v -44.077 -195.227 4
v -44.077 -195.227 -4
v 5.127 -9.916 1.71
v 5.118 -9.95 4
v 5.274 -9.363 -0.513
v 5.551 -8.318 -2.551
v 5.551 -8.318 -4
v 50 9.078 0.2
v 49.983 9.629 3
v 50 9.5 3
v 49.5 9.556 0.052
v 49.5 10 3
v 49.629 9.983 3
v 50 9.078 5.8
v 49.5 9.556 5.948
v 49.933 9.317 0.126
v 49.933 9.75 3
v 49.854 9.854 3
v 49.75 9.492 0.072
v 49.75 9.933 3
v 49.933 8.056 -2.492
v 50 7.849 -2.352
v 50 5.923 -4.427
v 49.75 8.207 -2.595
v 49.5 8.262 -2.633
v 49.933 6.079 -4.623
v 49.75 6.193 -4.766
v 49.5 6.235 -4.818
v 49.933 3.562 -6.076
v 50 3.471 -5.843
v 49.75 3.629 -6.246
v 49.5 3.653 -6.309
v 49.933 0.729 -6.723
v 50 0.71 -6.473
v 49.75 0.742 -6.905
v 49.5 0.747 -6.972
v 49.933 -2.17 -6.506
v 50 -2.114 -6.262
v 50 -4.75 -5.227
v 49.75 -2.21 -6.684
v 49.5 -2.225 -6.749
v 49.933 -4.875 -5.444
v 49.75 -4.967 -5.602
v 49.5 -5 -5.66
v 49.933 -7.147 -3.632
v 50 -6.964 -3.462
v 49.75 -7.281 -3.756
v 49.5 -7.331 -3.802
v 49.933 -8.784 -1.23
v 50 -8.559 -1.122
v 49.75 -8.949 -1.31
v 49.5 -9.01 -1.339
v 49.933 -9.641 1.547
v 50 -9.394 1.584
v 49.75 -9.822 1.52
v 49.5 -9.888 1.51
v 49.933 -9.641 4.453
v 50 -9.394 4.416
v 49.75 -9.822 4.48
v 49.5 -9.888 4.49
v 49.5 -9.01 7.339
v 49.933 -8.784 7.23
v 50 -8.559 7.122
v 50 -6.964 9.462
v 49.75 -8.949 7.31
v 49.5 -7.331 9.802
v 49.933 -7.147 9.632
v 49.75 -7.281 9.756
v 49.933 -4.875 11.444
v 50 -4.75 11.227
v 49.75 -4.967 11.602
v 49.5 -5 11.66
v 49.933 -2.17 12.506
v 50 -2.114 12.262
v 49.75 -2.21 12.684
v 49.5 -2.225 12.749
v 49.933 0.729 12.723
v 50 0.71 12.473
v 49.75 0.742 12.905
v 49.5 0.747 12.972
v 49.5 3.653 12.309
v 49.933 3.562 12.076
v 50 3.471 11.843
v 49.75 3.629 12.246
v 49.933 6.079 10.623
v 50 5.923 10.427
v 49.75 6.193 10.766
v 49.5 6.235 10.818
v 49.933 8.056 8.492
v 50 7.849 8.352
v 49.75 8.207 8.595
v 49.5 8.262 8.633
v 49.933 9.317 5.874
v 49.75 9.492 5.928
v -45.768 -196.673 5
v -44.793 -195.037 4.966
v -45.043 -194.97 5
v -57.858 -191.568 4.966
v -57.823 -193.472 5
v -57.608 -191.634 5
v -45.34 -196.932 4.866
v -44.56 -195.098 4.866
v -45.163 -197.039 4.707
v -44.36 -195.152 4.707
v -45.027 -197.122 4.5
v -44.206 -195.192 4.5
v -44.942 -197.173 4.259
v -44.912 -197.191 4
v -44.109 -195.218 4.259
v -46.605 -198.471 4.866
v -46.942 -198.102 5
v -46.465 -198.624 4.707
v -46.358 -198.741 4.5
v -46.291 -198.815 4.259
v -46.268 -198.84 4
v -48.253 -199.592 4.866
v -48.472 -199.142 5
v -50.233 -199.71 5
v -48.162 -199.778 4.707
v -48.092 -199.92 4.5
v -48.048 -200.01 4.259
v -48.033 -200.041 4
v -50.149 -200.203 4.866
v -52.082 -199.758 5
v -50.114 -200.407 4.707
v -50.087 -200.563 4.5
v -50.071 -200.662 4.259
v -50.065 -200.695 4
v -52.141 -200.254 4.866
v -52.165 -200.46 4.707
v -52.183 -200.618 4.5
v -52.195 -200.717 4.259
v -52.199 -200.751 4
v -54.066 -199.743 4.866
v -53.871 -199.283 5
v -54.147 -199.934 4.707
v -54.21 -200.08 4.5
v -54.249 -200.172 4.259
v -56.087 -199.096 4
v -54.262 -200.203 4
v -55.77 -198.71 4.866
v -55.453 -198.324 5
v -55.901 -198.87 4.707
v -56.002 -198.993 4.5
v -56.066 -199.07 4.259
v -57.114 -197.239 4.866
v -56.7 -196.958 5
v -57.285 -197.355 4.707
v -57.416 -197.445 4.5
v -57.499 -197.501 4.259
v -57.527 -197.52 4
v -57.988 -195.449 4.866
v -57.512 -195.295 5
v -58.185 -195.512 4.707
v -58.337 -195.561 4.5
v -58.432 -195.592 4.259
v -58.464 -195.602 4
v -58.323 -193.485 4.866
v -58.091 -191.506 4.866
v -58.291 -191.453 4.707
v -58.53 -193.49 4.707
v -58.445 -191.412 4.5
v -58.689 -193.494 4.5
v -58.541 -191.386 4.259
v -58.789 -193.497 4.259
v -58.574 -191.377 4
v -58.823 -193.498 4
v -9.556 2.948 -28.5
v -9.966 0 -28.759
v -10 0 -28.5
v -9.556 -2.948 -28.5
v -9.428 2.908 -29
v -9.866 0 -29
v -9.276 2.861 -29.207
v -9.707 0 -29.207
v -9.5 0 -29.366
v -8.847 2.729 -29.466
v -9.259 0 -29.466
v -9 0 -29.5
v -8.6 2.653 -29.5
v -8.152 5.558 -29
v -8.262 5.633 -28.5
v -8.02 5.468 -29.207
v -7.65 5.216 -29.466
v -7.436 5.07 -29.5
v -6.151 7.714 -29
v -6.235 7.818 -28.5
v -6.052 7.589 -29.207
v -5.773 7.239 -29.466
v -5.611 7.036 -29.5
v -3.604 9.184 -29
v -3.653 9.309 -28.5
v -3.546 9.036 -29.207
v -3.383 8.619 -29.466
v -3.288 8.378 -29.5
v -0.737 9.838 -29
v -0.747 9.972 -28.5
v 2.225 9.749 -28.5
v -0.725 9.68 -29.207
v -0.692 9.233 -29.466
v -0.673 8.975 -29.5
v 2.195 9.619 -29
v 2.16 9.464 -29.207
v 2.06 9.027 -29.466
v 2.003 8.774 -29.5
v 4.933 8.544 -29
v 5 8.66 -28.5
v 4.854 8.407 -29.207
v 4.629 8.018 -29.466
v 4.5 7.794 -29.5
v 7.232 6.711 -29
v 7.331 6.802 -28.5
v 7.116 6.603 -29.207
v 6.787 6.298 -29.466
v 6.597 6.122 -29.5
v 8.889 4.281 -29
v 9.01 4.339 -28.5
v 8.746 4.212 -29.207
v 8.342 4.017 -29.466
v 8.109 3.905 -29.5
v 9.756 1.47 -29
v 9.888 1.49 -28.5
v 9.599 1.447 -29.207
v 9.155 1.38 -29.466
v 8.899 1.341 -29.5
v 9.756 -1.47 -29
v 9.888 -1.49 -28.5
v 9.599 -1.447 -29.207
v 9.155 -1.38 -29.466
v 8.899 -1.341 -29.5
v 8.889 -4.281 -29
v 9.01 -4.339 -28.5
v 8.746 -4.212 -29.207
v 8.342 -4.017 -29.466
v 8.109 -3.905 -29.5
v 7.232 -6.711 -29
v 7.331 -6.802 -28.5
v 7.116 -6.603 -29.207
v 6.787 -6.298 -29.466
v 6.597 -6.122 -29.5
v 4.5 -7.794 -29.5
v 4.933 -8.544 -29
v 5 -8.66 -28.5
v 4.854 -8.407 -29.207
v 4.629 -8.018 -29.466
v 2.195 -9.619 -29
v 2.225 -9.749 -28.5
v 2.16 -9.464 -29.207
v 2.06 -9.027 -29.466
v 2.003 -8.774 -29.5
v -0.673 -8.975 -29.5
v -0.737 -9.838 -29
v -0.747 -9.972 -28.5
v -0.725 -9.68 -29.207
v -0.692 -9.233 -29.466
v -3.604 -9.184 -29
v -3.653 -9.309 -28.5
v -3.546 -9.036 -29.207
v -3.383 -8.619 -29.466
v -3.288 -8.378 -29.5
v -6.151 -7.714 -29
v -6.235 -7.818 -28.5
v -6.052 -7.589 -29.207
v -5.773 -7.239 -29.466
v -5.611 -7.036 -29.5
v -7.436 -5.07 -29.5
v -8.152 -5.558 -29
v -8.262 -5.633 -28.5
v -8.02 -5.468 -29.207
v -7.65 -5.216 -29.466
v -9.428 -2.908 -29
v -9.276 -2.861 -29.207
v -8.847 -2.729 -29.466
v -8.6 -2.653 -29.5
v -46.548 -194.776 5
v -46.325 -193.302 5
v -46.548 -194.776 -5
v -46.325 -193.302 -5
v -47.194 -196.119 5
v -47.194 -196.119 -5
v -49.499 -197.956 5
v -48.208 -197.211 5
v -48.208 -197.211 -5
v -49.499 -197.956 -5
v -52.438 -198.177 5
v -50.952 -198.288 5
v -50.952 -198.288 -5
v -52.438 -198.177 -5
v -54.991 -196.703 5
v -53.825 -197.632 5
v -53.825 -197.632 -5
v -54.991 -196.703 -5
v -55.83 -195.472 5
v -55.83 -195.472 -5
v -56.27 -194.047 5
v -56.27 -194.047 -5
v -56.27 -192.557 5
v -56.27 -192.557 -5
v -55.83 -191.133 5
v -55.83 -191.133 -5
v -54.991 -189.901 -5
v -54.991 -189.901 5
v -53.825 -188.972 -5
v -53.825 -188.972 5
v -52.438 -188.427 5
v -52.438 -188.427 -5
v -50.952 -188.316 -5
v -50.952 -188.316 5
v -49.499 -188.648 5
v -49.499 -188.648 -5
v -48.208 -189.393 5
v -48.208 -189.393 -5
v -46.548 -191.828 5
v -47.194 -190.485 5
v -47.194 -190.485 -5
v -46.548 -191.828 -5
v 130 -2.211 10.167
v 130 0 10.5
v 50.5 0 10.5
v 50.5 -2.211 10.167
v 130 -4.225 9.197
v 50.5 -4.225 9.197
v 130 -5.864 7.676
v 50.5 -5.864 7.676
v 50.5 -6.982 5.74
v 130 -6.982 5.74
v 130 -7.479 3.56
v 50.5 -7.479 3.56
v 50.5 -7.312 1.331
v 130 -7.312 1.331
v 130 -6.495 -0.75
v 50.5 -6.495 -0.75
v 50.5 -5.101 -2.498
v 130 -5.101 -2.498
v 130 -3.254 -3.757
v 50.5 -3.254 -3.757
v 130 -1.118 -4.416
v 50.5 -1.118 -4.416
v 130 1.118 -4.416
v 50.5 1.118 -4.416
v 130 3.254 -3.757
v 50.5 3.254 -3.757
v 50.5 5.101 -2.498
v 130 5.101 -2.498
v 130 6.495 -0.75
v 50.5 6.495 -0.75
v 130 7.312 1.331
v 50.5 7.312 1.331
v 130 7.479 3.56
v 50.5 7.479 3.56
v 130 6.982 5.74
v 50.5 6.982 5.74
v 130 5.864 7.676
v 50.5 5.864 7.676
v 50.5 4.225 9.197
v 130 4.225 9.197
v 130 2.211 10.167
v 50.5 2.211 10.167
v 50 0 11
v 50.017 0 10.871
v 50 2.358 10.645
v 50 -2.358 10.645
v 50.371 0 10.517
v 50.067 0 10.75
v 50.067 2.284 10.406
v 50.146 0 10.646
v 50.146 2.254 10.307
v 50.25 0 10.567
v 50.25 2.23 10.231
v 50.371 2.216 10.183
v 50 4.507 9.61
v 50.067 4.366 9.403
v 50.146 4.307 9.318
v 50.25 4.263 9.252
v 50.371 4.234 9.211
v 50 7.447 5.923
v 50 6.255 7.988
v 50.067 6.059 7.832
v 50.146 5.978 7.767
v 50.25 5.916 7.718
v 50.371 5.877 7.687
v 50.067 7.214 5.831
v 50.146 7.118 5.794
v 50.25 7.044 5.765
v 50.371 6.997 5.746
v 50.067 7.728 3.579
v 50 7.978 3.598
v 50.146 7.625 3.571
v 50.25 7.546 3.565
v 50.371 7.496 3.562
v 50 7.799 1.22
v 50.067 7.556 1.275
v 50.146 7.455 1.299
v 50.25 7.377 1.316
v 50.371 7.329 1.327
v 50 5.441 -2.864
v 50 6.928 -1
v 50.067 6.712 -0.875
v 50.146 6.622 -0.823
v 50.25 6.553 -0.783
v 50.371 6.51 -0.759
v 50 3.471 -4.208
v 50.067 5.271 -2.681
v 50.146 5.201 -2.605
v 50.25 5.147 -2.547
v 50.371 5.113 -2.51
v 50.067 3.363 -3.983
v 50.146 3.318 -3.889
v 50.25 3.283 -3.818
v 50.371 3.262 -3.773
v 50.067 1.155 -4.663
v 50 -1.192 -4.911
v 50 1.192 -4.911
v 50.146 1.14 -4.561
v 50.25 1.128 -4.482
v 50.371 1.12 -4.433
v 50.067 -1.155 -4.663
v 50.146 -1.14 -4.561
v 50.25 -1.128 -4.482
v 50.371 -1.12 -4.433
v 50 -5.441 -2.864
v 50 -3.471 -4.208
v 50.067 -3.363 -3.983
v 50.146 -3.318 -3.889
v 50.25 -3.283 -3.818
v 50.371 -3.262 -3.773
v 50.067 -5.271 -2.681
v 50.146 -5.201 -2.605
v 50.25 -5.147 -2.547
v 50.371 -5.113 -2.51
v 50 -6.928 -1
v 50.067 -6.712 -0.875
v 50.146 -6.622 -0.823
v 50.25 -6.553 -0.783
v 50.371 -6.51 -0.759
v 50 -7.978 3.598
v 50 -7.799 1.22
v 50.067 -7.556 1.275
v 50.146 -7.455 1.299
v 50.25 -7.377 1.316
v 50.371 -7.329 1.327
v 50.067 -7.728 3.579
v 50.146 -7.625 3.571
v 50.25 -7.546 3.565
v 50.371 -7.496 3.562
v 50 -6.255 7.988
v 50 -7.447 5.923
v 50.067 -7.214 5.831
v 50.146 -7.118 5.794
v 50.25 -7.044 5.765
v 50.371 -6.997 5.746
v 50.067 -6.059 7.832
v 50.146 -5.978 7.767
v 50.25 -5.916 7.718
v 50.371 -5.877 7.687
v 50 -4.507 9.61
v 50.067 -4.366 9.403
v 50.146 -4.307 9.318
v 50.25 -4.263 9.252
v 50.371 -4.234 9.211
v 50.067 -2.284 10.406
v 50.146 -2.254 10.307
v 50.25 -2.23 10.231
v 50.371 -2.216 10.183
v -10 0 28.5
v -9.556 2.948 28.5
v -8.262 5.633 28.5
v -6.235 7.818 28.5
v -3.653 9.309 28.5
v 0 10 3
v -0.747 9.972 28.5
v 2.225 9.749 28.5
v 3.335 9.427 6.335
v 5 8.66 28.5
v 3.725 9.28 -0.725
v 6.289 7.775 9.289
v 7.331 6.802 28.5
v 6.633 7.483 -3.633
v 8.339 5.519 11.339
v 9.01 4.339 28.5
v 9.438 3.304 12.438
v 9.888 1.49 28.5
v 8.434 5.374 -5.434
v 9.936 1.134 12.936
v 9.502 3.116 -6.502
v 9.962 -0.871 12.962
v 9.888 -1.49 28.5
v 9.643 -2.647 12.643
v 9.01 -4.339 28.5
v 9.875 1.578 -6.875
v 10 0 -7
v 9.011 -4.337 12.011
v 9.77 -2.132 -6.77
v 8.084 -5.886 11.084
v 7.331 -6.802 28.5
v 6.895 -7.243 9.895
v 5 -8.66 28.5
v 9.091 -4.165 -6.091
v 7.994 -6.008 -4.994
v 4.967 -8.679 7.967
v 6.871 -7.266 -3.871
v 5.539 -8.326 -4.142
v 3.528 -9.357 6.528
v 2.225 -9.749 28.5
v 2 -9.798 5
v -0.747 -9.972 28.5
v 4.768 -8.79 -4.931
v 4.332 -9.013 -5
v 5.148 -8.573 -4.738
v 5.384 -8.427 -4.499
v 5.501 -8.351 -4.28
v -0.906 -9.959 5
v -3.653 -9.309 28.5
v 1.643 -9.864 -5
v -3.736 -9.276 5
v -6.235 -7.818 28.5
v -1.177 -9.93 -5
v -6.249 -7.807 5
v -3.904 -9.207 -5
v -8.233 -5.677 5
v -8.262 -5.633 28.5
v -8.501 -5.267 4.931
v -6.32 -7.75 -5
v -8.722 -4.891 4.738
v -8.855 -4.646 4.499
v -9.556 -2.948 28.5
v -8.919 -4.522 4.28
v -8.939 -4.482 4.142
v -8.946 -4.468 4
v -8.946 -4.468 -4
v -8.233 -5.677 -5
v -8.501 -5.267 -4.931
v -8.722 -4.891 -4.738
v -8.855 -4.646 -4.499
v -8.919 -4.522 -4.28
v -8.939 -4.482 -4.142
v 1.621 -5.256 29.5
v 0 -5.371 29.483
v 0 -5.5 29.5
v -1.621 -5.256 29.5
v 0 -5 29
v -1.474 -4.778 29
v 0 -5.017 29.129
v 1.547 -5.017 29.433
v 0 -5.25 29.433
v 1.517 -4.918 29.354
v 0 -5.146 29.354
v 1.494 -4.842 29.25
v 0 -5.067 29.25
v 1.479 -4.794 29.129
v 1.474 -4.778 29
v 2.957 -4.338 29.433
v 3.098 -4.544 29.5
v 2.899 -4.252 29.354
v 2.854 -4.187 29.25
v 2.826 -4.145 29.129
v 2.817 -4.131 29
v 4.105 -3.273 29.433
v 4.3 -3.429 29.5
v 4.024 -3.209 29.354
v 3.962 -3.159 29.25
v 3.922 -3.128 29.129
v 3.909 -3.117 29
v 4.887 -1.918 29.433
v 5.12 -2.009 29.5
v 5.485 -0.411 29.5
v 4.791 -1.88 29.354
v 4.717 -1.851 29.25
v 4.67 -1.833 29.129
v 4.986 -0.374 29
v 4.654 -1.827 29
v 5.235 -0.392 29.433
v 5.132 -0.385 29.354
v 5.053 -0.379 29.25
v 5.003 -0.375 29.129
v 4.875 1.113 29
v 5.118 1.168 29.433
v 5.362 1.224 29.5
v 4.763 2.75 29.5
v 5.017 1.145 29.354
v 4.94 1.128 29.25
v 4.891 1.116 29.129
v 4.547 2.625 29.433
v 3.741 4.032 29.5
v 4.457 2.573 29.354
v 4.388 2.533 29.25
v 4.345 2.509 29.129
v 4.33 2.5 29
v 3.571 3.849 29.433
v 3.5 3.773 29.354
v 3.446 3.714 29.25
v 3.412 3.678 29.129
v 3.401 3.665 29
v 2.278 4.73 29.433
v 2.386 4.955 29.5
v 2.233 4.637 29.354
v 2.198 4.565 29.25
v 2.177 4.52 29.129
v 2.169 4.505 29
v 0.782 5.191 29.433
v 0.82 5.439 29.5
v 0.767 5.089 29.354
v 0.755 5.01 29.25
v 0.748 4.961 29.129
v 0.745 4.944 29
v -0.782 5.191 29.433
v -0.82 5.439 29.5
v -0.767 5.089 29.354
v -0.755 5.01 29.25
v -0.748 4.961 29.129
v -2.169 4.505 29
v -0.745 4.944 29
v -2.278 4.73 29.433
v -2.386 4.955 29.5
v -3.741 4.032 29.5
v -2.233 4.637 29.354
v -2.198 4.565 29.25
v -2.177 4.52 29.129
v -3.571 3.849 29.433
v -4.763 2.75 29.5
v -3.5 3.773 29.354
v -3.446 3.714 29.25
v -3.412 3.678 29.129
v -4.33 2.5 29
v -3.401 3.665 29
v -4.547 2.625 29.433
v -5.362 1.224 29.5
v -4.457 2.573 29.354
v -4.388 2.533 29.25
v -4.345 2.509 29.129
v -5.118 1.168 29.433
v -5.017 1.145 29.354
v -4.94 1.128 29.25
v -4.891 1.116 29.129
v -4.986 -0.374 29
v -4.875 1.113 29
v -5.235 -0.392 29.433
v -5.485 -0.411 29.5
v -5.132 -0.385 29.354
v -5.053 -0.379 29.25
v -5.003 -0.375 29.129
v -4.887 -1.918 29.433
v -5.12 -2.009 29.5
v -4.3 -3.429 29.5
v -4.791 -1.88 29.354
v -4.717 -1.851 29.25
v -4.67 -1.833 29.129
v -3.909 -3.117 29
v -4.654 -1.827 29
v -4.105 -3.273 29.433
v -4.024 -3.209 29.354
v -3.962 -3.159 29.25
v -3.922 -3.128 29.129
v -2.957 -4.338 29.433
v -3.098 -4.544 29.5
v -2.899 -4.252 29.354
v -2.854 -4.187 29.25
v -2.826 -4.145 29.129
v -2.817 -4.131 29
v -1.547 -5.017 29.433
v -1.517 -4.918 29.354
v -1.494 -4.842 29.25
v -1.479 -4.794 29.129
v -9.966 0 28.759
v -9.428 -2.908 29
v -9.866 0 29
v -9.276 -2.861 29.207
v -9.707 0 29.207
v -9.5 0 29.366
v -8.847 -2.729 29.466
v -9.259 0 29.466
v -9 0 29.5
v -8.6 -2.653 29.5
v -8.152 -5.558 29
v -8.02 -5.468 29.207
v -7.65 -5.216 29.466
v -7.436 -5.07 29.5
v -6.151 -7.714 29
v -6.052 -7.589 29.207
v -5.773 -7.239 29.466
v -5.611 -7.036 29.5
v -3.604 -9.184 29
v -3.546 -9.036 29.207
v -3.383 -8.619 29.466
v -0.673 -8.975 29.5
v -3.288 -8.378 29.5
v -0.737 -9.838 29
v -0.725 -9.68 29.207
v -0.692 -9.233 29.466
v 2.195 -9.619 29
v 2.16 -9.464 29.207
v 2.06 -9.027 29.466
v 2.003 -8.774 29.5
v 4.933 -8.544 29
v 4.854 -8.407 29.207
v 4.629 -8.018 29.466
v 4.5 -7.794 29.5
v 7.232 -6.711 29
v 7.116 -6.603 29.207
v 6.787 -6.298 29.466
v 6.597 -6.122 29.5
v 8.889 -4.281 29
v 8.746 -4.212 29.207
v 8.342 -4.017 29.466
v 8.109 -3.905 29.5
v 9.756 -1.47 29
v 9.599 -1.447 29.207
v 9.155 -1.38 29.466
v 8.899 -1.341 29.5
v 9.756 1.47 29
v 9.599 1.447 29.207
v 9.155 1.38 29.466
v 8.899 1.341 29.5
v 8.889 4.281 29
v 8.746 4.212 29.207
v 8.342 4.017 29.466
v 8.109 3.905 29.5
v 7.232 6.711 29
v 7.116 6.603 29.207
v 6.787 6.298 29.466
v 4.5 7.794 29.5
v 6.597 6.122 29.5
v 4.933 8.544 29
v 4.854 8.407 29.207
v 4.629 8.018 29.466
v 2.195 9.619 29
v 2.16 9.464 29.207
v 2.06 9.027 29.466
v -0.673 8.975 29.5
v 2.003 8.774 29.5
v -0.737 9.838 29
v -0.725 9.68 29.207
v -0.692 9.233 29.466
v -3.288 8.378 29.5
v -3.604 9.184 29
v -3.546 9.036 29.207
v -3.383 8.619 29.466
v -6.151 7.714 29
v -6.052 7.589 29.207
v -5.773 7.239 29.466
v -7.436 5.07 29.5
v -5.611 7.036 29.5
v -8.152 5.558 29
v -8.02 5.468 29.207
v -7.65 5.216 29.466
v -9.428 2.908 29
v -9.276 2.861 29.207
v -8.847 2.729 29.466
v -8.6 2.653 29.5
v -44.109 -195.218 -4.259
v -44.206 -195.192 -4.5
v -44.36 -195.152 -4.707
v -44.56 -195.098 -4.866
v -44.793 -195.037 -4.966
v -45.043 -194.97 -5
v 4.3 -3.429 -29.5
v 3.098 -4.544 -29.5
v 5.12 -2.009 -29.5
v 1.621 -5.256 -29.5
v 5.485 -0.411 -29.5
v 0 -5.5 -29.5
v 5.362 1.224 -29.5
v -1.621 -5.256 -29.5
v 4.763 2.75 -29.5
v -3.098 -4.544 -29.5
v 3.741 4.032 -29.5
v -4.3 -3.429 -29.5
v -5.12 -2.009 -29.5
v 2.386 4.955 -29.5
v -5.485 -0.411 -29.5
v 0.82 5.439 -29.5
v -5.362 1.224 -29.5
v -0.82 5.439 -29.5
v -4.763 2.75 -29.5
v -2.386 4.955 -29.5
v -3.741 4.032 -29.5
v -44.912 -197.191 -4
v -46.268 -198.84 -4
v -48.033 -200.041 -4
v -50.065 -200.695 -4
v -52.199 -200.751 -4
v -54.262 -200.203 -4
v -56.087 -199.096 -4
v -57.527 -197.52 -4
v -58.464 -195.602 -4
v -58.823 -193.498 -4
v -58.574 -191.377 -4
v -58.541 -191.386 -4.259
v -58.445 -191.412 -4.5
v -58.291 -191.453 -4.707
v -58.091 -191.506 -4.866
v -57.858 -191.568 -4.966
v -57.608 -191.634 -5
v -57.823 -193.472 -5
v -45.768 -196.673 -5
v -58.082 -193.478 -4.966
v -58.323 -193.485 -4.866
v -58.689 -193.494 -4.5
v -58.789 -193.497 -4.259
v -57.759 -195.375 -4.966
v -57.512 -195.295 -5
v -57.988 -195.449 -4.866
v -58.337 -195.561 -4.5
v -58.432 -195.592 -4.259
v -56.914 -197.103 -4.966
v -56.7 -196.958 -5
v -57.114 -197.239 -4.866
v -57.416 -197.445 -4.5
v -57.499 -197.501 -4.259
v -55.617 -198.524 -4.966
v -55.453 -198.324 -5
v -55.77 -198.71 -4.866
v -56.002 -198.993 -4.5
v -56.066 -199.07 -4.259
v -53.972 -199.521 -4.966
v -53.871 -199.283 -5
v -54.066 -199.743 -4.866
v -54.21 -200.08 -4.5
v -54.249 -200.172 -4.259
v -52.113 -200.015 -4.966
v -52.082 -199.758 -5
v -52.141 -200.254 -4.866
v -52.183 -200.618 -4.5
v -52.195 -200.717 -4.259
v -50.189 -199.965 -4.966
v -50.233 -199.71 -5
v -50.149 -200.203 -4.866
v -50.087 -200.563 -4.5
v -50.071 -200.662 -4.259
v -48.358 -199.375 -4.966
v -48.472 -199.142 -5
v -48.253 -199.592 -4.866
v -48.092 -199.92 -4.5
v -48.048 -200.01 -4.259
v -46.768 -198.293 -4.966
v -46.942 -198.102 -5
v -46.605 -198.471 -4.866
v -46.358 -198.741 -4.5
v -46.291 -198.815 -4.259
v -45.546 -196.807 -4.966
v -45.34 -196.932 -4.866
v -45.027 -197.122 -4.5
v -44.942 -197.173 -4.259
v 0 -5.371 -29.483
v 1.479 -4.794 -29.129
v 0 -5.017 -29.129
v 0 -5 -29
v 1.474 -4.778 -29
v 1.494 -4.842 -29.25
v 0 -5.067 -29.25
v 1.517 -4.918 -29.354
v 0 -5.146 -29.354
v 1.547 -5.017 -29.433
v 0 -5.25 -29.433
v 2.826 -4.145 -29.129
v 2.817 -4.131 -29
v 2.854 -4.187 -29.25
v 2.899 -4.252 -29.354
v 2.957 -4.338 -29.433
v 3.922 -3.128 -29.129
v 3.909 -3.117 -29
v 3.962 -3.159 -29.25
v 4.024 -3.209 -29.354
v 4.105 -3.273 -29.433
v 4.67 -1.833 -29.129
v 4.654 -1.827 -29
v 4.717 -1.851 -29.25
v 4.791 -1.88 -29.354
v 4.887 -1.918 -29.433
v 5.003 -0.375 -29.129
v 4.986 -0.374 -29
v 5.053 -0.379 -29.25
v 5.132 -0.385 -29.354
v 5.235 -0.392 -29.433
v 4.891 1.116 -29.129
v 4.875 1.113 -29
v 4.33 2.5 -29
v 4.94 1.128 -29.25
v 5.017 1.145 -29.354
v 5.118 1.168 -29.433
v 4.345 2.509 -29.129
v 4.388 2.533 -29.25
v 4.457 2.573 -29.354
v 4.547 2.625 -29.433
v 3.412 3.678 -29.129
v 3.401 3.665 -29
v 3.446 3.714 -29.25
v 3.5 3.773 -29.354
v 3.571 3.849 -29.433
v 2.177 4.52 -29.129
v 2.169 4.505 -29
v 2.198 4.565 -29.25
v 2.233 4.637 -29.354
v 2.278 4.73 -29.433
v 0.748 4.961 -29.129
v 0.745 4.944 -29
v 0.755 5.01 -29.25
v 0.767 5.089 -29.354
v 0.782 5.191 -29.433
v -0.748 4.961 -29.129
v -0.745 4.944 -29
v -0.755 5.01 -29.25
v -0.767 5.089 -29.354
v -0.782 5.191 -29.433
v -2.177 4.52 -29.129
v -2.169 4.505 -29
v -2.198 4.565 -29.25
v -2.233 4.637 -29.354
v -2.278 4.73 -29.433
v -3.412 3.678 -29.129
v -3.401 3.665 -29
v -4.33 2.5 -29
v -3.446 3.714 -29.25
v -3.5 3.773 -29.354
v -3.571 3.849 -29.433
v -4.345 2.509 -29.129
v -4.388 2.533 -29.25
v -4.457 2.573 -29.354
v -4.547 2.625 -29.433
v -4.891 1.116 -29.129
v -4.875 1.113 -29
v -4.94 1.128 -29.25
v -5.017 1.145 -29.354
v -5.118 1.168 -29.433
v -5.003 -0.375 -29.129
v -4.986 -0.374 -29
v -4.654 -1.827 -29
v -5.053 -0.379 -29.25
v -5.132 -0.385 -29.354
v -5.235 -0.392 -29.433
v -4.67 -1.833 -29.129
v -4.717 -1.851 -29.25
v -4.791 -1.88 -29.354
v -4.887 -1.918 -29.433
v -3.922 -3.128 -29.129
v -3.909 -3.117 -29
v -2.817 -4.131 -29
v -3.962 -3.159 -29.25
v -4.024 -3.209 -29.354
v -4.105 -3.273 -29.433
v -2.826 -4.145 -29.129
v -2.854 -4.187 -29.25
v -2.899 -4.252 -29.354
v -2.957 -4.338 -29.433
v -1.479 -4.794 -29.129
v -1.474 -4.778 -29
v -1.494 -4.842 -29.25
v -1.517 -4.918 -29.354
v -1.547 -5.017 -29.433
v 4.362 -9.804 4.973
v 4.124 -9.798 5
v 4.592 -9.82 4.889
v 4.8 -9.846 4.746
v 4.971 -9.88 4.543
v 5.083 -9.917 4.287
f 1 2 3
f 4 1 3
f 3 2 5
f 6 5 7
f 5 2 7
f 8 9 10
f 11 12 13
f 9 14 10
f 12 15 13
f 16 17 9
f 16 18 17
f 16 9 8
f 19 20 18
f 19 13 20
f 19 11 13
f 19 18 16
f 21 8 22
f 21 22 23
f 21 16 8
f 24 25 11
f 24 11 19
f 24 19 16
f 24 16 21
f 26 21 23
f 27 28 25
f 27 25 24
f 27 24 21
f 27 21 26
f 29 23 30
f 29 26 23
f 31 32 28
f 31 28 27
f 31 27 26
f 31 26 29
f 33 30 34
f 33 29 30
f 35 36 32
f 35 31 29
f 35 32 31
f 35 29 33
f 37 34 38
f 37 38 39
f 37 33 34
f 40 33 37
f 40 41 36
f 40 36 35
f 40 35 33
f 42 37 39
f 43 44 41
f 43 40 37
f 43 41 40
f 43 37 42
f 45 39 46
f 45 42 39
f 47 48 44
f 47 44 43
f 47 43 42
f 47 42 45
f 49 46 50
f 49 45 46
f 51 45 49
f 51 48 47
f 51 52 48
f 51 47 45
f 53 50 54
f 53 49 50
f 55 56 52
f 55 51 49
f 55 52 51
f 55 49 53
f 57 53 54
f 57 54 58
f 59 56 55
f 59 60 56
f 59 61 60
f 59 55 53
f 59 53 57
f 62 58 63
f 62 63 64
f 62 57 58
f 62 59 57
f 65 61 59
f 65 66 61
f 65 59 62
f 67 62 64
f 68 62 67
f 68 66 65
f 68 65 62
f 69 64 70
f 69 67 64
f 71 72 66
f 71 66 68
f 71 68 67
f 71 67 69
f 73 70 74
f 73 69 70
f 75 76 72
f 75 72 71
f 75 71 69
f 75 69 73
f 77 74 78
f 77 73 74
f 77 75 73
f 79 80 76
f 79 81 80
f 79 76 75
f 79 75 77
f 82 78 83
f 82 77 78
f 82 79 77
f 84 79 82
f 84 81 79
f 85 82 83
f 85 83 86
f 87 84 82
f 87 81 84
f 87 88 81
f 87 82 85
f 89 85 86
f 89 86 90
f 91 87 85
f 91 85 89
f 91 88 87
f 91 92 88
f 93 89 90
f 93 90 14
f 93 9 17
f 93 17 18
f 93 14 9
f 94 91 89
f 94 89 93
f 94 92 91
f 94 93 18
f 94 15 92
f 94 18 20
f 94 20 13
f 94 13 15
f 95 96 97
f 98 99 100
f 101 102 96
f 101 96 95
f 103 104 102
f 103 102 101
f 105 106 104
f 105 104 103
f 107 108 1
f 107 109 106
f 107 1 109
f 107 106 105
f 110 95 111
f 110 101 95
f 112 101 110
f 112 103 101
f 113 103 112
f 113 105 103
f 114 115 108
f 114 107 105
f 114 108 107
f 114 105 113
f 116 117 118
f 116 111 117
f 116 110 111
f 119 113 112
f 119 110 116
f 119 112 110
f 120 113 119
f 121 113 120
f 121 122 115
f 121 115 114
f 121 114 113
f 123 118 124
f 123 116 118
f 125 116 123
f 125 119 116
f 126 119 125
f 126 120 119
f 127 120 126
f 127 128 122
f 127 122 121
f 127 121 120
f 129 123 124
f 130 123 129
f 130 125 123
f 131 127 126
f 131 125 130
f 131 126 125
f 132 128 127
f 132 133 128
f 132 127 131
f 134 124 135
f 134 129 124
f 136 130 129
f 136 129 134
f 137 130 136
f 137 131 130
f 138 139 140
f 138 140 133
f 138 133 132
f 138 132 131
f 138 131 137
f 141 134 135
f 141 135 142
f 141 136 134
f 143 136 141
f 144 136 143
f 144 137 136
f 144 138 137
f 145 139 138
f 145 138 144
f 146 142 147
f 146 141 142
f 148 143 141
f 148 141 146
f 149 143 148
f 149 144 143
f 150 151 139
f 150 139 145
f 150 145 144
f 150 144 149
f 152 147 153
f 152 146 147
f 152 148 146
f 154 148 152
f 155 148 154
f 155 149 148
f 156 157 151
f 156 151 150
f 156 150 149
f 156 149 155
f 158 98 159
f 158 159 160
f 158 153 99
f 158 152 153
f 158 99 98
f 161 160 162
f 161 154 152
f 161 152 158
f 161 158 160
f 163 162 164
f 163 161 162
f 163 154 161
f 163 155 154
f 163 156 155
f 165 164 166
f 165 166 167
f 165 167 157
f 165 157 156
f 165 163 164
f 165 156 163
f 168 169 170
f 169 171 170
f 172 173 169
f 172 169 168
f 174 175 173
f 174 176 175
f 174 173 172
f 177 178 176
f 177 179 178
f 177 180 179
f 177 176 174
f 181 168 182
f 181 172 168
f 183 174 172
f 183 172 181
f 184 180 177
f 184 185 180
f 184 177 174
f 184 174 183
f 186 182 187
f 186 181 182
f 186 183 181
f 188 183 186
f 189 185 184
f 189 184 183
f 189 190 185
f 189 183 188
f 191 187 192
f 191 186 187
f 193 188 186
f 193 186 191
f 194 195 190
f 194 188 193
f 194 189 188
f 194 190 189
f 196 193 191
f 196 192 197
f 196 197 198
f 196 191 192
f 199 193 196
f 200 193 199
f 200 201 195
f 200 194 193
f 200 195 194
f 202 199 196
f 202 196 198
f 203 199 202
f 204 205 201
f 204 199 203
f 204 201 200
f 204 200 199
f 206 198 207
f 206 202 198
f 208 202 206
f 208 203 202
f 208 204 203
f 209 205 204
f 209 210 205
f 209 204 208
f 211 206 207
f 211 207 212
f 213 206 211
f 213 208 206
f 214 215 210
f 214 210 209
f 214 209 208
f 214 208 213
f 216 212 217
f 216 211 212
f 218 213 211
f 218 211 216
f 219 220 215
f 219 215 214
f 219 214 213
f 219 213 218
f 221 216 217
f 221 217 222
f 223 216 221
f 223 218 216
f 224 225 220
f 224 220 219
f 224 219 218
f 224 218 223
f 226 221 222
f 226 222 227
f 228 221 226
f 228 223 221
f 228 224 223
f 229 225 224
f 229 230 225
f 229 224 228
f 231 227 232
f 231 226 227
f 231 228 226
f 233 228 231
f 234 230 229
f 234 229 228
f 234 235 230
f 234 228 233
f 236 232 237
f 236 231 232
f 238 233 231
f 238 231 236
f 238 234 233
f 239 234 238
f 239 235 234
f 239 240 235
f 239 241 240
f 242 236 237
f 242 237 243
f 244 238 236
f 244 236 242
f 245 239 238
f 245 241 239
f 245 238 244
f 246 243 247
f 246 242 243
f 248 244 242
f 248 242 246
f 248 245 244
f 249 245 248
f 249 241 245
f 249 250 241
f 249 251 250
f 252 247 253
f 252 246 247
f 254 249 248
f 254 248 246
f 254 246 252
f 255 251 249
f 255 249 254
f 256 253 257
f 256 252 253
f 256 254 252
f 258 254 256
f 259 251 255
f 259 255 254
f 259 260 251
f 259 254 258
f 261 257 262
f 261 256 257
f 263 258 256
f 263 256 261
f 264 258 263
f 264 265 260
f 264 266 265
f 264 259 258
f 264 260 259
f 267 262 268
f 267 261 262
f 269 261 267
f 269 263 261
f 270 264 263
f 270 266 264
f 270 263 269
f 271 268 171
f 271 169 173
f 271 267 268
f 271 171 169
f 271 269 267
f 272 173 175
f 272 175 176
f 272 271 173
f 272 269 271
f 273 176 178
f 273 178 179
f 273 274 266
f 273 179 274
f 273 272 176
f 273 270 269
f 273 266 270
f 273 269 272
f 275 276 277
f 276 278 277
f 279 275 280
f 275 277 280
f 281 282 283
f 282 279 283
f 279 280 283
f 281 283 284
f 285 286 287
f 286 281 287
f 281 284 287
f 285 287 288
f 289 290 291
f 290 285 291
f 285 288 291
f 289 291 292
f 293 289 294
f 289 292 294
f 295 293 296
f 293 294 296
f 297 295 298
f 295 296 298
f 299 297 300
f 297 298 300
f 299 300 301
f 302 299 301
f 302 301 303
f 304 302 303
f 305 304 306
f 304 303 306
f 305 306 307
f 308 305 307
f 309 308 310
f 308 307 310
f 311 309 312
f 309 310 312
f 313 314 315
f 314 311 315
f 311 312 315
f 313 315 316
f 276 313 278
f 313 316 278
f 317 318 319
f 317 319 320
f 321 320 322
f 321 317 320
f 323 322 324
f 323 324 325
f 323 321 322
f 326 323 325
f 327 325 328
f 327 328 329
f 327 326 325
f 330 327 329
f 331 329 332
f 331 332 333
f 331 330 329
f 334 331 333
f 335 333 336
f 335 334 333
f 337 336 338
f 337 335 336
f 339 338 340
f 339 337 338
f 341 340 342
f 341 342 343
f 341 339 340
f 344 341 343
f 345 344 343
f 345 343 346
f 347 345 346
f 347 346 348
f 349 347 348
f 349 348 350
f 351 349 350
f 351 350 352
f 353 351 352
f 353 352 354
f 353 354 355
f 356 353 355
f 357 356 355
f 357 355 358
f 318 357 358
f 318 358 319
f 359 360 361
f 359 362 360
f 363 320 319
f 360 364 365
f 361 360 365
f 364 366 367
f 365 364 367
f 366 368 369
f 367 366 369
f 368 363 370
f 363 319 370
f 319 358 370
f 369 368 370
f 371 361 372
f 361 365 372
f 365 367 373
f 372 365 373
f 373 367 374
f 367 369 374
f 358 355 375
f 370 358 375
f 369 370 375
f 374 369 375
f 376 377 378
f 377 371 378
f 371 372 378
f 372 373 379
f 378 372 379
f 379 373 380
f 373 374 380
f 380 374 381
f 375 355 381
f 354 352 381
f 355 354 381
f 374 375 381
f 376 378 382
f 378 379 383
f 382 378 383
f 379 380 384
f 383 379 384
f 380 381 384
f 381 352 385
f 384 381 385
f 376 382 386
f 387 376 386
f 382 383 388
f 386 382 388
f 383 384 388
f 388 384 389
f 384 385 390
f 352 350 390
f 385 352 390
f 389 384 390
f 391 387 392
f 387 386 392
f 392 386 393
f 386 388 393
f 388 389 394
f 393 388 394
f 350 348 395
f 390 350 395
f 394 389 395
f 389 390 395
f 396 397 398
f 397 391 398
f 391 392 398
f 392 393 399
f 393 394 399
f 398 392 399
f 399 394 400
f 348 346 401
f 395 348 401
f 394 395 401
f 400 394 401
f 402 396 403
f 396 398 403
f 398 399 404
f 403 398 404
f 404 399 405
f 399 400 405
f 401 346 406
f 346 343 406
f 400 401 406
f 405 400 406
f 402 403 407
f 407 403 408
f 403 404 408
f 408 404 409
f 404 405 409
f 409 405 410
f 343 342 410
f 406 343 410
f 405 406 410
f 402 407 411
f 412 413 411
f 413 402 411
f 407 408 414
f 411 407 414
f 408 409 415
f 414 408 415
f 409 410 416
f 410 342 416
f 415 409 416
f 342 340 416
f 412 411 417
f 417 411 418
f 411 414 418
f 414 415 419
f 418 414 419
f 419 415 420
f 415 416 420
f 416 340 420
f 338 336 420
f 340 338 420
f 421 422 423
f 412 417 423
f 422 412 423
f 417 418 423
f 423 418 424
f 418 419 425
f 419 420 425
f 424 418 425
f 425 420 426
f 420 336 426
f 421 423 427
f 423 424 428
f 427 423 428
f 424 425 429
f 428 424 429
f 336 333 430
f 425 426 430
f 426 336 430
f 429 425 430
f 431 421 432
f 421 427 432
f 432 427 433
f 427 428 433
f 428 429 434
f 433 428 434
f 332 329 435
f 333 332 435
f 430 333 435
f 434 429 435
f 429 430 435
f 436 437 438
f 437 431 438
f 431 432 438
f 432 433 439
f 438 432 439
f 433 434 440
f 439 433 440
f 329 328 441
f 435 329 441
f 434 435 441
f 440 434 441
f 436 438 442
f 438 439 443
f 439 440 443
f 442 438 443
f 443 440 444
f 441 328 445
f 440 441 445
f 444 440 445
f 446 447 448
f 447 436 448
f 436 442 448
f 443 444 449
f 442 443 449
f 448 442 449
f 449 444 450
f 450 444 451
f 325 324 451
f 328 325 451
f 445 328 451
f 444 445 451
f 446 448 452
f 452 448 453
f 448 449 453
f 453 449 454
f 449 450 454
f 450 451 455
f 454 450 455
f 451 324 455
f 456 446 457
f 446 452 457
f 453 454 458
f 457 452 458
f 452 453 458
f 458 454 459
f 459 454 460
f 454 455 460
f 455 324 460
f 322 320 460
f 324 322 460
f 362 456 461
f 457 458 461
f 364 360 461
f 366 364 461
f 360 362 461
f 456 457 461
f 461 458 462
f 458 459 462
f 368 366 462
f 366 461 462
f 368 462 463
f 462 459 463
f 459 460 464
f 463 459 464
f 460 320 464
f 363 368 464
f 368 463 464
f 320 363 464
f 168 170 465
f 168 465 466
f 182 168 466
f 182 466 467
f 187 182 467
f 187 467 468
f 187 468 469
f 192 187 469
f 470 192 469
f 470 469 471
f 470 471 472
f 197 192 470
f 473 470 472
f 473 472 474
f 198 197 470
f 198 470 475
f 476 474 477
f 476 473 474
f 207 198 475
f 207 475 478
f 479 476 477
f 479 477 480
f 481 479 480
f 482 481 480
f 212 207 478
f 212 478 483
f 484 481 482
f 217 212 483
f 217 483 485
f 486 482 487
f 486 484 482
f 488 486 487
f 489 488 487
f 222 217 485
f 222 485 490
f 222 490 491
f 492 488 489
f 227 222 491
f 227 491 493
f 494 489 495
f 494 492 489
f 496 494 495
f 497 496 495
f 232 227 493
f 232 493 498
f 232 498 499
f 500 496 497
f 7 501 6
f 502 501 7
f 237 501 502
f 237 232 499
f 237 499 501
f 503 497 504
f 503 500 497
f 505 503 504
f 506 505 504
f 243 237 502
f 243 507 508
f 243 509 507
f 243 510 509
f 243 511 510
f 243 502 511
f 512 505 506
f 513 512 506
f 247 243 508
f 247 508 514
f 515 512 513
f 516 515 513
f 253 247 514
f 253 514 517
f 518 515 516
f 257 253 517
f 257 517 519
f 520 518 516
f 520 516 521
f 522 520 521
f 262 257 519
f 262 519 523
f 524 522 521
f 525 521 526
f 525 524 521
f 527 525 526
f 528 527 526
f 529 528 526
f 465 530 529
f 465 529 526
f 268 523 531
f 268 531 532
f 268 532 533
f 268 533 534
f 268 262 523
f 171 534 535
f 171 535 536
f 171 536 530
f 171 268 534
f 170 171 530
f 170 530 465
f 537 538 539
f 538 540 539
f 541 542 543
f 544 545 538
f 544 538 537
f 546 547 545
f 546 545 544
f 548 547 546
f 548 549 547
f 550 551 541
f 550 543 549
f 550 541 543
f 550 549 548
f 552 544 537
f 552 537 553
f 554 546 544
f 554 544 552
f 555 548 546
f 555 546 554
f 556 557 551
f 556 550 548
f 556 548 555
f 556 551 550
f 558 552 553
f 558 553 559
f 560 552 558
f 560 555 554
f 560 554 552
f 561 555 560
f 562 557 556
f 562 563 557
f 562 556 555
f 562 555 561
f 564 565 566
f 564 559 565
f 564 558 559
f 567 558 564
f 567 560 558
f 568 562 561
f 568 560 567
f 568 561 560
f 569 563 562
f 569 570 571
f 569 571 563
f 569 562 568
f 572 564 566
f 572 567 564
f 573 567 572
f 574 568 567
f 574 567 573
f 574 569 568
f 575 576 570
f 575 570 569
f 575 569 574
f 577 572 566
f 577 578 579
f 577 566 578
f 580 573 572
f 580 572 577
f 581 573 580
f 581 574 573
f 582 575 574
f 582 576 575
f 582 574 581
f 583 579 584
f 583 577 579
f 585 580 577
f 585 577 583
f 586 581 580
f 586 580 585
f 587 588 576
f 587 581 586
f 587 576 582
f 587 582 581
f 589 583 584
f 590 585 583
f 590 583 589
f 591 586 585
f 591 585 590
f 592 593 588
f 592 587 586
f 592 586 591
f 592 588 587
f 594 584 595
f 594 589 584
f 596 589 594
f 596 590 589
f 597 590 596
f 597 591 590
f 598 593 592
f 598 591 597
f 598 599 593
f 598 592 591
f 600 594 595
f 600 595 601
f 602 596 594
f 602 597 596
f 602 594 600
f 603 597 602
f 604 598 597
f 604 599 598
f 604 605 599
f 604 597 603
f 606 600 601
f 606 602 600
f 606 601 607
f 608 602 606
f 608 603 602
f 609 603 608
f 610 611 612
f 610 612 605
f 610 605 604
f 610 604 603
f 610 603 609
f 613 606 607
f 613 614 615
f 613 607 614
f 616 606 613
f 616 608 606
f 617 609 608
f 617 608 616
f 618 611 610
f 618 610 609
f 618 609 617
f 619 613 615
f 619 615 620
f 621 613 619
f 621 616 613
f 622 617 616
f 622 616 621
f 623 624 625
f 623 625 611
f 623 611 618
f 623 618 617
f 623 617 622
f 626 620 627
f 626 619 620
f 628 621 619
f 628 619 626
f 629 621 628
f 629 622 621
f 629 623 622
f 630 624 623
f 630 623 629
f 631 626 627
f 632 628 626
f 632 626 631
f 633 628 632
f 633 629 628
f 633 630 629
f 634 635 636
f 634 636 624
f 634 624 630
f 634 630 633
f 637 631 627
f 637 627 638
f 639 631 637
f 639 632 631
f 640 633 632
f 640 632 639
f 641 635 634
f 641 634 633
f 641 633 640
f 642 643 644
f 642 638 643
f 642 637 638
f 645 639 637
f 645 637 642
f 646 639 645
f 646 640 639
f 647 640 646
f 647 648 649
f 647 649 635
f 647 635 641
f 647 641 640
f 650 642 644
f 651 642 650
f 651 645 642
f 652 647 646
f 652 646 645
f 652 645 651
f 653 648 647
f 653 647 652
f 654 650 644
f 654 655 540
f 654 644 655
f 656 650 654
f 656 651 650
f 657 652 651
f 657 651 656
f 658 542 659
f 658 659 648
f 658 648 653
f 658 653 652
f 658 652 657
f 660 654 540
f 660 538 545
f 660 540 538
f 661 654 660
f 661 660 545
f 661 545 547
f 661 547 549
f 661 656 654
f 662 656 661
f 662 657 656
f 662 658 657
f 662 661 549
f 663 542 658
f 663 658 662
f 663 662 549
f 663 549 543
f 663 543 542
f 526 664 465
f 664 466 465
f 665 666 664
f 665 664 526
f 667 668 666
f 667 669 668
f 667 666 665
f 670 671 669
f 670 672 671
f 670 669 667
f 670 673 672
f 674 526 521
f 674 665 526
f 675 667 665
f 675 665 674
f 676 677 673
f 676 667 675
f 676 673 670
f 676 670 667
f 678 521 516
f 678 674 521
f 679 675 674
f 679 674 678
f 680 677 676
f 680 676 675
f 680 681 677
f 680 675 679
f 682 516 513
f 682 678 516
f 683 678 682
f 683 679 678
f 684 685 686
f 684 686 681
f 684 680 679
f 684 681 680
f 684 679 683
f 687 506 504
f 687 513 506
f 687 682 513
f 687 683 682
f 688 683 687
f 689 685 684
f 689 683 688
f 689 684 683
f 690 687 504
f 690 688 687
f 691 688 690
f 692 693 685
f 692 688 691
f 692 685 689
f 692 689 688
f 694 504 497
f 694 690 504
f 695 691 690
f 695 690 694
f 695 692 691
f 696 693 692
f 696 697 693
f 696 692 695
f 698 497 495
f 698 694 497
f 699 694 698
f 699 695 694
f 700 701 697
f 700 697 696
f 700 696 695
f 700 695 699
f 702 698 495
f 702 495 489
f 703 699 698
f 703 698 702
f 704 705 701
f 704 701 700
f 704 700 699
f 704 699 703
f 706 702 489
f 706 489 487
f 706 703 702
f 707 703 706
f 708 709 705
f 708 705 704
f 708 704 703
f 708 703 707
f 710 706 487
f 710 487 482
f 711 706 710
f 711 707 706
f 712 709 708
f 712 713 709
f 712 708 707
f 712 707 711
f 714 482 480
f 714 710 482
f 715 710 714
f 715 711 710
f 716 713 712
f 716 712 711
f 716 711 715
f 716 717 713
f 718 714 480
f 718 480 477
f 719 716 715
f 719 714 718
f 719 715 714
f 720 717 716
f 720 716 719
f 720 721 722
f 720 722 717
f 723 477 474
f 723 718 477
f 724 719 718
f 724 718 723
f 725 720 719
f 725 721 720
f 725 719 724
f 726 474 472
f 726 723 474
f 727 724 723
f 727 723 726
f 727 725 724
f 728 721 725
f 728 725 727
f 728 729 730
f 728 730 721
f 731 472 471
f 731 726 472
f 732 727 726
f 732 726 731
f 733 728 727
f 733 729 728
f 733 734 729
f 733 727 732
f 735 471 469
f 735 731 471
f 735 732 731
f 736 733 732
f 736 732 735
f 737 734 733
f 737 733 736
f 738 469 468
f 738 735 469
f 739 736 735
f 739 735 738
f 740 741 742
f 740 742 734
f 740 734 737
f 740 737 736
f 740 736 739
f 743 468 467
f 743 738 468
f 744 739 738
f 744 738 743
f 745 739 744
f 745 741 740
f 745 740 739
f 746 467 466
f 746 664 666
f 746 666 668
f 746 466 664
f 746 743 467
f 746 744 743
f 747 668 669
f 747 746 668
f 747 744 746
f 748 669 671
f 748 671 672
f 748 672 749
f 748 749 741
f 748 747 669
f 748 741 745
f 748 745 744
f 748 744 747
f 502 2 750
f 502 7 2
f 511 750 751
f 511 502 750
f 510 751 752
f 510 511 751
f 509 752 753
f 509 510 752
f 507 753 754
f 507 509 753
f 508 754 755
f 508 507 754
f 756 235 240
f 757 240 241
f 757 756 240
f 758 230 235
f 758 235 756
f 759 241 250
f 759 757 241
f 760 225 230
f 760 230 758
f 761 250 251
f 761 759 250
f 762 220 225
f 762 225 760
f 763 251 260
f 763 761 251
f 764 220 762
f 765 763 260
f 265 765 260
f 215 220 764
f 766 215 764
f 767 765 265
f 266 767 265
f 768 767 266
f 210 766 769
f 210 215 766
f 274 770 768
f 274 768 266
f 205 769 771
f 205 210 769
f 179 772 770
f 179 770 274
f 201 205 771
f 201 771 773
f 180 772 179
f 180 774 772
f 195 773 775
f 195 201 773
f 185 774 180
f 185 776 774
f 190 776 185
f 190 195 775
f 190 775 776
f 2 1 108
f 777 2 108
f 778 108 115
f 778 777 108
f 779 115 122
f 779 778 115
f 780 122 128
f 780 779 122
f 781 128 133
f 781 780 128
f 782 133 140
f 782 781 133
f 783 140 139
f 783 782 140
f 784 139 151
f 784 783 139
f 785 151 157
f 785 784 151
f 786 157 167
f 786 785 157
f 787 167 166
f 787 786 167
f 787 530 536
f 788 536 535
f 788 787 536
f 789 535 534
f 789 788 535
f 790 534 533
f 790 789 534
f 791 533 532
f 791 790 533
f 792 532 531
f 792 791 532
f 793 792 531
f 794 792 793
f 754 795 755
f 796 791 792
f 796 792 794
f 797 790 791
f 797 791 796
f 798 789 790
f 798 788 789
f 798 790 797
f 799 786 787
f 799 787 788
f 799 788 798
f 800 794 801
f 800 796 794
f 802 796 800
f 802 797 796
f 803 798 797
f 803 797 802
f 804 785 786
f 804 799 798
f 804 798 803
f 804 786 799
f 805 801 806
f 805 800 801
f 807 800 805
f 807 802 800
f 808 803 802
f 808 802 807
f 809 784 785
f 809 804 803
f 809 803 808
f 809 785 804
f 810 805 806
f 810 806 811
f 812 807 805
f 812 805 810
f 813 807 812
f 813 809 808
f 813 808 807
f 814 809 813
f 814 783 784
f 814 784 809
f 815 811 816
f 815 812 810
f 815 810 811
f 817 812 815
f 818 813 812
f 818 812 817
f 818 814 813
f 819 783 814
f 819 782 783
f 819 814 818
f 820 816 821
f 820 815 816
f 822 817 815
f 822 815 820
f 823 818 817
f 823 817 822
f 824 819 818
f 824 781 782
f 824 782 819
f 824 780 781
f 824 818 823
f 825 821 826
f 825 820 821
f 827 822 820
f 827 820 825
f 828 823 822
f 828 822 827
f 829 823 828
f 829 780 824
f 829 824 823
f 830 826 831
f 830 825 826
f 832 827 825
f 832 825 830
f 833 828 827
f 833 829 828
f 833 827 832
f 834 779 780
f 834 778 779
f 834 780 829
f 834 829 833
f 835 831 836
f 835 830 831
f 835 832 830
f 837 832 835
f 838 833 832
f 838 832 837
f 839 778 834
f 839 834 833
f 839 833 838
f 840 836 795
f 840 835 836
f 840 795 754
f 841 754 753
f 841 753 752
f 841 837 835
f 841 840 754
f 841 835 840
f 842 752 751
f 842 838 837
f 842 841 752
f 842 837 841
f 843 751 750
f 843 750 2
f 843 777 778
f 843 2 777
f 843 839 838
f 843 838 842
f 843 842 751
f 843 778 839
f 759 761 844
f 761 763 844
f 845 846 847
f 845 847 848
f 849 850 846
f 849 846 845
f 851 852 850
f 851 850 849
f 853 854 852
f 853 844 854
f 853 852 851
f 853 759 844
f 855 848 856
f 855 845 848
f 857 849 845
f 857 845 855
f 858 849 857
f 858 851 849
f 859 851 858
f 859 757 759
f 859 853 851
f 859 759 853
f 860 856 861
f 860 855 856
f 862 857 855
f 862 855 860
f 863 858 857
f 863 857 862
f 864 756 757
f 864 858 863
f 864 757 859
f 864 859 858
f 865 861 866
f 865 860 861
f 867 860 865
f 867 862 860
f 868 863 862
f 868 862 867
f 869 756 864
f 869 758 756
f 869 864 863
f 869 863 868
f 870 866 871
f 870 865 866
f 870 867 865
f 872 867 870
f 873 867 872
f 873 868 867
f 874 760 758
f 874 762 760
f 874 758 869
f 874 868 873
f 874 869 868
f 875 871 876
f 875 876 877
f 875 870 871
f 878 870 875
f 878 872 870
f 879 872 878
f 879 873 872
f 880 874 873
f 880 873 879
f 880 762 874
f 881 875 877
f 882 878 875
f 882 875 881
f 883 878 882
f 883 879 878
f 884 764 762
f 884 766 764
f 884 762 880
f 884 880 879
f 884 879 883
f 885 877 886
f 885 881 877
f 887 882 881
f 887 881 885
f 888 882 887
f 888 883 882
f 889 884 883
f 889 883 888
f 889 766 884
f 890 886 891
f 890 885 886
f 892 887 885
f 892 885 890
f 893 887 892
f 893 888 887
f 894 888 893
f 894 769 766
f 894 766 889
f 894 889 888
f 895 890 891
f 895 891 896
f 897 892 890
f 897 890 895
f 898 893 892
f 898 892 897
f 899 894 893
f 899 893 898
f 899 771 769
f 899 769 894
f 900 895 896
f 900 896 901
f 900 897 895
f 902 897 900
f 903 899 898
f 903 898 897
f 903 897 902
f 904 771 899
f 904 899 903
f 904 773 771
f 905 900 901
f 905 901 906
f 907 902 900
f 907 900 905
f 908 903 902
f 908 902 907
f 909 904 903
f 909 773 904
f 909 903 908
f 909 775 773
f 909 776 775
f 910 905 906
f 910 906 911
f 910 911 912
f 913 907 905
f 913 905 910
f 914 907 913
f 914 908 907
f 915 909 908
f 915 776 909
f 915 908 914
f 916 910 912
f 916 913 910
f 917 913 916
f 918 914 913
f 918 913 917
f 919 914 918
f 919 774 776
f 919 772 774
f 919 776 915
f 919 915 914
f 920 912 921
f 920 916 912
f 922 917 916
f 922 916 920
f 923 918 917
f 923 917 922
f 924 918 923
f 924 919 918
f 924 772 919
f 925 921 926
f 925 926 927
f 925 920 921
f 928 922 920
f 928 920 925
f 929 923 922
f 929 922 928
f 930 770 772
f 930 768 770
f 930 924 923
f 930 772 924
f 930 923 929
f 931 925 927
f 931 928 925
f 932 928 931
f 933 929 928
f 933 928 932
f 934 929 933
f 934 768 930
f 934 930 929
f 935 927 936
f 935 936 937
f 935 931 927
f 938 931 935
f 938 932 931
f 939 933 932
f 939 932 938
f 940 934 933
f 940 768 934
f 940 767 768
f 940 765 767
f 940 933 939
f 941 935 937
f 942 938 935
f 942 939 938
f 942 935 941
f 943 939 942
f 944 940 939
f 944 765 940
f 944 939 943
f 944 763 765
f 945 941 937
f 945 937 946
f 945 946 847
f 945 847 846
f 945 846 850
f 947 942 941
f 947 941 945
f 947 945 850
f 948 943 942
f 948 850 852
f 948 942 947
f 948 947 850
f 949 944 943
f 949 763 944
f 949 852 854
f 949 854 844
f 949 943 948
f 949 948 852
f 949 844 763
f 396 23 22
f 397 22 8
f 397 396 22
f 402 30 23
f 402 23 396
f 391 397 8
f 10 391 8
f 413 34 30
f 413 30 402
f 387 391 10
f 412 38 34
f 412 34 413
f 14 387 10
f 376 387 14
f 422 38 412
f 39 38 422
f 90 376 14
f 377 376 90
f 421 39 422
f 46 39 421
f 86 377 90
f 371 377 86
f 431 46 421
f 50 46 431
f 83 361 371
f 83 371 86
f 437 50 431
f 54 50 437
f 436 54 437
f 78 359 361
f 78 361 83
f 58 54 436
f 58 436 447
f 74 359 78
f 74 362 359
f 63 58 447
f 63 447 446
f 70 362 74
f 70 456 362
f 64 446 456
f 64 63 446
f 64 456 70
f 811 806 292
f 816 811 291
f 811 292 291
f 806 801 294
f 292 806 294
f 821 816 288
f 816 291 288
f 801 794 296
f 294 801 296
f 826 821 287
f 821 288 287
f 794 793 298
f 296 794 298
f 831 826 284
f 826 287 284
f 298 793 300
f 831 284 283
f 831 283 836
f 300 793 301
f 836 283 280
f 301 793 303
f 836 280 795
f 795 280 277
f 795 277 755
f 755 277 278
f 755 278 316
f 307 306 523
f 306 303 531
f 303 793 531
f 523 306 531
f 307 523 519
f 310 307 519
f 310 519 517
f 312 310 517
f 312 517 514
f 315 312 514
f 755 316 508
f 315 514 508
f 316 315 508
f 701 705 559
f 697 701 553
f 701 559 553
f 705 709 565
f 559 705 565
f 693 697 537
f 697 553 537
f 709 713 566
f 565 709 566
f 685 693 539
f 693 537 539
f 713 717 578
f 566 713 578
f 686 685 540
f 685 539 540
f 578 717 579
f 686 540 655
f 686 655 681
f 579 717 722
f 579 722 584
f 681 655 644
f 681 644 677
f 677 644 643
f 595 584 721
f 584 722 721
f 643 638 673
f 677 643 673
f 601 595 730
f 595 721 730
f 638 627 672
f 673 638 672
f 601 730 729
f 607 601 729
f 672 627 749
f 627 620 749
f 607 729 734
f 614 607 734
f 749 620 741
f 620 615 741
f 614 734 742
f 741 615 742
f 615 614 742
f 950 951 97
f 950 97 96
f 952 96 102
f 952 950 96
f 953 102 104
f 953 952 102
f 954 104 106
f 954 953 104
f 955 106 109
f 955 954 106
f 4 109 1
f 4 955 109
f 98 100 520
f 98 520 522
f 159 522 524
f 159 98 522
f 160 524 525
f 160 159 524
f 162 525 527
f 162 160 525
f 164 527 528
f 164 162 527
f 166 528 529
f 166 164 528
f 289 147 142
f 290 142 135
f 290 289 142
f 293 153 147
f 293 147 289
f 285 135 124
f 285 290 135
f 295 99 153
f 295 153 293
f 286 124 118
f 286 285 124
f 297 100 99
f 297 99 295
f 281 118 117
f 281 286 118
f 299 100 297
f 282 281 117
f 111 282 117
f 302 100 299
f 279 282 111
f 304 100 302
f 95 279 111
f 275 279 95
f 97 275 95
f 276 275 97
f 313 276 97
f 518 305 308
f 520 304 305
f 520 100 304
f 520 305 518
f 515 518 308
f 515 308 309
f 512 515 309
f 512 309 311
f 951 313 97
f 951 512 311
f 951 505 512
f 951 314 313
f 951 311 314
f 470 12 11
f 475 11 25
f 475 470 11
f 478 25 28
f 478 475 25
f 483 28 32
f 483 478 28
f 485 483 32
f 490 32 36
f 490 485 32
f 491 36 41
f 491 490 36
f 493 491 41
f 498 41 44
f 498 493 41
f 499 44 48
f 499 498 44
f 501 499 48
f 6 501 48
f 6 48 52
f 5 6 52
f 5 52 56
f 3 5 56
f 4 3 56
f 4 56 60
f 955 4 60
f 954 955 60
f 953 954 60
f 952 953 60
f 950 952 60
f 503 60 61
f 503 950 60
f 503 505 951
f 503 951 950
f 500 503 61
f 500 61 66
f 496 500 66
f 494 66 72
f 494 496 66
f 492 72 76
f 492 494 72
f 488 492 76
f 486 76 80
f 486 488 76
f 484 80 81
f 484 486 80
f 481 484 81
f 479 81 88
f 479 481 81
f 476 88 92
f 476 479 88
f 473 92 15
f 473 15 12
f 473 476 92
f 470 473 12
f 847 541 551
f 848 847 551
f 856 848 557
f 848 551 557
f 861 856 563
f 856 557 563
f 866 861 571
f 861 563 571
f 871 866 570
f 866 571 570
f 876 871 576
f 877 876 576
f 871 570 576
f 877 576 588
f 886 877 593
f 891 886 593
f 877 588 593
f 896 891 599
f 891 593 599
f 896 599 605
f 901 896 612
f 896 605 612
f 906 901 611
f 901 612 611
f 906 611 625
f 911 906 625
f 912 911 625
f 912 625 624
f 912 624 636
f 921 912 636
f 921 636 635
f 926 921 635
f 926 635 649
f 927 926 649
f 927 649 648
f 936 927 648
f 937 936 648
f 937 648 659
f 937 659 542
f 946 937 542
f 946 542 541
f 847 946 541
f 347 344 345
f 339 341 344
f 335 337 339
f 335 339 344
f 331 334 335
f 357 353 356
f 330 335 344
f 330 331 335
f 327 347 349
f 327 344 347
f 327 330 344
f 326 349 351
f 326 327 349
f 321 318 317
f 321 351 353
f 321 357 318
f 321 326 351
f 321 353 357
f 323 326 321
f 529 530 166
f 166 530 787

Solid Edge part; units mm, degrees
sketch "Sketch1" plane through (0, 0, 0) normal (0, -1, 0) x (1, 0, 0)
  line L0 (-10, -29.5) -> (0, -29.5)
  line L1 (0, 29.5) -> (0, -29.5)
  line L2 (0, 29.5) -> (-10, 29.5)
  line L3 (-10, 29.5) -> (-10, -29.5)
revolve "RevolvedProtrusion1" add sketch "Sketch1" angle 360 about axis through (0, 0, 54) along (0, 0, -1)
sketch "Sketch2" plane through (0, 0, 0) normal (1, 0, 0) x (0, 1, 0)
  circle A0 centre (0, 3) radius 10
  dimension "D1" = 32.5
extrude "Protrusion1" add sketch "Sketch2" along normal blind 130
sketch "Sketch3" plane through (0, 0, 0) normal (0, 0, 1) x (1, 0, 0)
  circle A0 centre (-51.3254, -193.3021) radius 5
  line L0 (-8.9463, -4.4682) -> (-58.5742, -191.3774)
  arc A1 (-58.5742, -191.3774) -> (-44.0765, -195.2268) centre (-51.3254, -193.3021) ccw
  line L1 (-44.0765, -195.2268) -> (5.5514, -8.3176)
  arc A2 (5.5514, -8.3176) -> (-8.9463, -4.4682) centre (0, 0) cw
  dimension "D1" = 15
  dimension "D2" = 200
extrude "Styrarm" add sketch "Sketch3" along normal mid plane 10
hole "Hole1" at (0, 0, 29.5) direction (0, 0, -1) diameter 10 end up to next
sketch "Sketch4" plane through (0, 0, 0) normal (0, -1, 0) x (1, 0, 0)
  line L0 (130, 13) -> (50, 13)
  line L1 (50, 13) -> (50, 10.5)
  line L2 (50, 10.5) -> (130, 10.5)
  line L3 (130, 10.5) -> (130, 13)
  dimension "D1" = 80
  dimension "D2" = 2.5
revolve "RevolvedCutout1" cut sketch "Sketch4" angle 360 about axis through (-7036.1143, 0, 3) along (1, 0, 0)
fillet "Round1" radius 0.5 1 edges at (50, 0, -4.5)
fillet "Round_2" radius 0.5 1 edges at (50, 0, -7)
fillet "Round_3" radius 1 1 edges at (10, 0, 29.5)
fillet "Round_4" radius 1 1 edges at (10, 0, -29.5)
fillet "Round_5" radius 0.5 1 edges at (-5, 0, 29.5)
fillet "Round_6" radius 0.5 1 edges at (-5, 0, -29.5)
fillet "Round_7" radius 1 6 edges at (-19.4591, -102.5124, 5) (-33.7602, -97.9228, 5) (-19.2626, -101.7722, -5) (-33.7602, -97.9228, -5) (-53.2501, -200.5509, 5) (-53.2501, -200.5509, -5)
properties material "Stainless steel"
